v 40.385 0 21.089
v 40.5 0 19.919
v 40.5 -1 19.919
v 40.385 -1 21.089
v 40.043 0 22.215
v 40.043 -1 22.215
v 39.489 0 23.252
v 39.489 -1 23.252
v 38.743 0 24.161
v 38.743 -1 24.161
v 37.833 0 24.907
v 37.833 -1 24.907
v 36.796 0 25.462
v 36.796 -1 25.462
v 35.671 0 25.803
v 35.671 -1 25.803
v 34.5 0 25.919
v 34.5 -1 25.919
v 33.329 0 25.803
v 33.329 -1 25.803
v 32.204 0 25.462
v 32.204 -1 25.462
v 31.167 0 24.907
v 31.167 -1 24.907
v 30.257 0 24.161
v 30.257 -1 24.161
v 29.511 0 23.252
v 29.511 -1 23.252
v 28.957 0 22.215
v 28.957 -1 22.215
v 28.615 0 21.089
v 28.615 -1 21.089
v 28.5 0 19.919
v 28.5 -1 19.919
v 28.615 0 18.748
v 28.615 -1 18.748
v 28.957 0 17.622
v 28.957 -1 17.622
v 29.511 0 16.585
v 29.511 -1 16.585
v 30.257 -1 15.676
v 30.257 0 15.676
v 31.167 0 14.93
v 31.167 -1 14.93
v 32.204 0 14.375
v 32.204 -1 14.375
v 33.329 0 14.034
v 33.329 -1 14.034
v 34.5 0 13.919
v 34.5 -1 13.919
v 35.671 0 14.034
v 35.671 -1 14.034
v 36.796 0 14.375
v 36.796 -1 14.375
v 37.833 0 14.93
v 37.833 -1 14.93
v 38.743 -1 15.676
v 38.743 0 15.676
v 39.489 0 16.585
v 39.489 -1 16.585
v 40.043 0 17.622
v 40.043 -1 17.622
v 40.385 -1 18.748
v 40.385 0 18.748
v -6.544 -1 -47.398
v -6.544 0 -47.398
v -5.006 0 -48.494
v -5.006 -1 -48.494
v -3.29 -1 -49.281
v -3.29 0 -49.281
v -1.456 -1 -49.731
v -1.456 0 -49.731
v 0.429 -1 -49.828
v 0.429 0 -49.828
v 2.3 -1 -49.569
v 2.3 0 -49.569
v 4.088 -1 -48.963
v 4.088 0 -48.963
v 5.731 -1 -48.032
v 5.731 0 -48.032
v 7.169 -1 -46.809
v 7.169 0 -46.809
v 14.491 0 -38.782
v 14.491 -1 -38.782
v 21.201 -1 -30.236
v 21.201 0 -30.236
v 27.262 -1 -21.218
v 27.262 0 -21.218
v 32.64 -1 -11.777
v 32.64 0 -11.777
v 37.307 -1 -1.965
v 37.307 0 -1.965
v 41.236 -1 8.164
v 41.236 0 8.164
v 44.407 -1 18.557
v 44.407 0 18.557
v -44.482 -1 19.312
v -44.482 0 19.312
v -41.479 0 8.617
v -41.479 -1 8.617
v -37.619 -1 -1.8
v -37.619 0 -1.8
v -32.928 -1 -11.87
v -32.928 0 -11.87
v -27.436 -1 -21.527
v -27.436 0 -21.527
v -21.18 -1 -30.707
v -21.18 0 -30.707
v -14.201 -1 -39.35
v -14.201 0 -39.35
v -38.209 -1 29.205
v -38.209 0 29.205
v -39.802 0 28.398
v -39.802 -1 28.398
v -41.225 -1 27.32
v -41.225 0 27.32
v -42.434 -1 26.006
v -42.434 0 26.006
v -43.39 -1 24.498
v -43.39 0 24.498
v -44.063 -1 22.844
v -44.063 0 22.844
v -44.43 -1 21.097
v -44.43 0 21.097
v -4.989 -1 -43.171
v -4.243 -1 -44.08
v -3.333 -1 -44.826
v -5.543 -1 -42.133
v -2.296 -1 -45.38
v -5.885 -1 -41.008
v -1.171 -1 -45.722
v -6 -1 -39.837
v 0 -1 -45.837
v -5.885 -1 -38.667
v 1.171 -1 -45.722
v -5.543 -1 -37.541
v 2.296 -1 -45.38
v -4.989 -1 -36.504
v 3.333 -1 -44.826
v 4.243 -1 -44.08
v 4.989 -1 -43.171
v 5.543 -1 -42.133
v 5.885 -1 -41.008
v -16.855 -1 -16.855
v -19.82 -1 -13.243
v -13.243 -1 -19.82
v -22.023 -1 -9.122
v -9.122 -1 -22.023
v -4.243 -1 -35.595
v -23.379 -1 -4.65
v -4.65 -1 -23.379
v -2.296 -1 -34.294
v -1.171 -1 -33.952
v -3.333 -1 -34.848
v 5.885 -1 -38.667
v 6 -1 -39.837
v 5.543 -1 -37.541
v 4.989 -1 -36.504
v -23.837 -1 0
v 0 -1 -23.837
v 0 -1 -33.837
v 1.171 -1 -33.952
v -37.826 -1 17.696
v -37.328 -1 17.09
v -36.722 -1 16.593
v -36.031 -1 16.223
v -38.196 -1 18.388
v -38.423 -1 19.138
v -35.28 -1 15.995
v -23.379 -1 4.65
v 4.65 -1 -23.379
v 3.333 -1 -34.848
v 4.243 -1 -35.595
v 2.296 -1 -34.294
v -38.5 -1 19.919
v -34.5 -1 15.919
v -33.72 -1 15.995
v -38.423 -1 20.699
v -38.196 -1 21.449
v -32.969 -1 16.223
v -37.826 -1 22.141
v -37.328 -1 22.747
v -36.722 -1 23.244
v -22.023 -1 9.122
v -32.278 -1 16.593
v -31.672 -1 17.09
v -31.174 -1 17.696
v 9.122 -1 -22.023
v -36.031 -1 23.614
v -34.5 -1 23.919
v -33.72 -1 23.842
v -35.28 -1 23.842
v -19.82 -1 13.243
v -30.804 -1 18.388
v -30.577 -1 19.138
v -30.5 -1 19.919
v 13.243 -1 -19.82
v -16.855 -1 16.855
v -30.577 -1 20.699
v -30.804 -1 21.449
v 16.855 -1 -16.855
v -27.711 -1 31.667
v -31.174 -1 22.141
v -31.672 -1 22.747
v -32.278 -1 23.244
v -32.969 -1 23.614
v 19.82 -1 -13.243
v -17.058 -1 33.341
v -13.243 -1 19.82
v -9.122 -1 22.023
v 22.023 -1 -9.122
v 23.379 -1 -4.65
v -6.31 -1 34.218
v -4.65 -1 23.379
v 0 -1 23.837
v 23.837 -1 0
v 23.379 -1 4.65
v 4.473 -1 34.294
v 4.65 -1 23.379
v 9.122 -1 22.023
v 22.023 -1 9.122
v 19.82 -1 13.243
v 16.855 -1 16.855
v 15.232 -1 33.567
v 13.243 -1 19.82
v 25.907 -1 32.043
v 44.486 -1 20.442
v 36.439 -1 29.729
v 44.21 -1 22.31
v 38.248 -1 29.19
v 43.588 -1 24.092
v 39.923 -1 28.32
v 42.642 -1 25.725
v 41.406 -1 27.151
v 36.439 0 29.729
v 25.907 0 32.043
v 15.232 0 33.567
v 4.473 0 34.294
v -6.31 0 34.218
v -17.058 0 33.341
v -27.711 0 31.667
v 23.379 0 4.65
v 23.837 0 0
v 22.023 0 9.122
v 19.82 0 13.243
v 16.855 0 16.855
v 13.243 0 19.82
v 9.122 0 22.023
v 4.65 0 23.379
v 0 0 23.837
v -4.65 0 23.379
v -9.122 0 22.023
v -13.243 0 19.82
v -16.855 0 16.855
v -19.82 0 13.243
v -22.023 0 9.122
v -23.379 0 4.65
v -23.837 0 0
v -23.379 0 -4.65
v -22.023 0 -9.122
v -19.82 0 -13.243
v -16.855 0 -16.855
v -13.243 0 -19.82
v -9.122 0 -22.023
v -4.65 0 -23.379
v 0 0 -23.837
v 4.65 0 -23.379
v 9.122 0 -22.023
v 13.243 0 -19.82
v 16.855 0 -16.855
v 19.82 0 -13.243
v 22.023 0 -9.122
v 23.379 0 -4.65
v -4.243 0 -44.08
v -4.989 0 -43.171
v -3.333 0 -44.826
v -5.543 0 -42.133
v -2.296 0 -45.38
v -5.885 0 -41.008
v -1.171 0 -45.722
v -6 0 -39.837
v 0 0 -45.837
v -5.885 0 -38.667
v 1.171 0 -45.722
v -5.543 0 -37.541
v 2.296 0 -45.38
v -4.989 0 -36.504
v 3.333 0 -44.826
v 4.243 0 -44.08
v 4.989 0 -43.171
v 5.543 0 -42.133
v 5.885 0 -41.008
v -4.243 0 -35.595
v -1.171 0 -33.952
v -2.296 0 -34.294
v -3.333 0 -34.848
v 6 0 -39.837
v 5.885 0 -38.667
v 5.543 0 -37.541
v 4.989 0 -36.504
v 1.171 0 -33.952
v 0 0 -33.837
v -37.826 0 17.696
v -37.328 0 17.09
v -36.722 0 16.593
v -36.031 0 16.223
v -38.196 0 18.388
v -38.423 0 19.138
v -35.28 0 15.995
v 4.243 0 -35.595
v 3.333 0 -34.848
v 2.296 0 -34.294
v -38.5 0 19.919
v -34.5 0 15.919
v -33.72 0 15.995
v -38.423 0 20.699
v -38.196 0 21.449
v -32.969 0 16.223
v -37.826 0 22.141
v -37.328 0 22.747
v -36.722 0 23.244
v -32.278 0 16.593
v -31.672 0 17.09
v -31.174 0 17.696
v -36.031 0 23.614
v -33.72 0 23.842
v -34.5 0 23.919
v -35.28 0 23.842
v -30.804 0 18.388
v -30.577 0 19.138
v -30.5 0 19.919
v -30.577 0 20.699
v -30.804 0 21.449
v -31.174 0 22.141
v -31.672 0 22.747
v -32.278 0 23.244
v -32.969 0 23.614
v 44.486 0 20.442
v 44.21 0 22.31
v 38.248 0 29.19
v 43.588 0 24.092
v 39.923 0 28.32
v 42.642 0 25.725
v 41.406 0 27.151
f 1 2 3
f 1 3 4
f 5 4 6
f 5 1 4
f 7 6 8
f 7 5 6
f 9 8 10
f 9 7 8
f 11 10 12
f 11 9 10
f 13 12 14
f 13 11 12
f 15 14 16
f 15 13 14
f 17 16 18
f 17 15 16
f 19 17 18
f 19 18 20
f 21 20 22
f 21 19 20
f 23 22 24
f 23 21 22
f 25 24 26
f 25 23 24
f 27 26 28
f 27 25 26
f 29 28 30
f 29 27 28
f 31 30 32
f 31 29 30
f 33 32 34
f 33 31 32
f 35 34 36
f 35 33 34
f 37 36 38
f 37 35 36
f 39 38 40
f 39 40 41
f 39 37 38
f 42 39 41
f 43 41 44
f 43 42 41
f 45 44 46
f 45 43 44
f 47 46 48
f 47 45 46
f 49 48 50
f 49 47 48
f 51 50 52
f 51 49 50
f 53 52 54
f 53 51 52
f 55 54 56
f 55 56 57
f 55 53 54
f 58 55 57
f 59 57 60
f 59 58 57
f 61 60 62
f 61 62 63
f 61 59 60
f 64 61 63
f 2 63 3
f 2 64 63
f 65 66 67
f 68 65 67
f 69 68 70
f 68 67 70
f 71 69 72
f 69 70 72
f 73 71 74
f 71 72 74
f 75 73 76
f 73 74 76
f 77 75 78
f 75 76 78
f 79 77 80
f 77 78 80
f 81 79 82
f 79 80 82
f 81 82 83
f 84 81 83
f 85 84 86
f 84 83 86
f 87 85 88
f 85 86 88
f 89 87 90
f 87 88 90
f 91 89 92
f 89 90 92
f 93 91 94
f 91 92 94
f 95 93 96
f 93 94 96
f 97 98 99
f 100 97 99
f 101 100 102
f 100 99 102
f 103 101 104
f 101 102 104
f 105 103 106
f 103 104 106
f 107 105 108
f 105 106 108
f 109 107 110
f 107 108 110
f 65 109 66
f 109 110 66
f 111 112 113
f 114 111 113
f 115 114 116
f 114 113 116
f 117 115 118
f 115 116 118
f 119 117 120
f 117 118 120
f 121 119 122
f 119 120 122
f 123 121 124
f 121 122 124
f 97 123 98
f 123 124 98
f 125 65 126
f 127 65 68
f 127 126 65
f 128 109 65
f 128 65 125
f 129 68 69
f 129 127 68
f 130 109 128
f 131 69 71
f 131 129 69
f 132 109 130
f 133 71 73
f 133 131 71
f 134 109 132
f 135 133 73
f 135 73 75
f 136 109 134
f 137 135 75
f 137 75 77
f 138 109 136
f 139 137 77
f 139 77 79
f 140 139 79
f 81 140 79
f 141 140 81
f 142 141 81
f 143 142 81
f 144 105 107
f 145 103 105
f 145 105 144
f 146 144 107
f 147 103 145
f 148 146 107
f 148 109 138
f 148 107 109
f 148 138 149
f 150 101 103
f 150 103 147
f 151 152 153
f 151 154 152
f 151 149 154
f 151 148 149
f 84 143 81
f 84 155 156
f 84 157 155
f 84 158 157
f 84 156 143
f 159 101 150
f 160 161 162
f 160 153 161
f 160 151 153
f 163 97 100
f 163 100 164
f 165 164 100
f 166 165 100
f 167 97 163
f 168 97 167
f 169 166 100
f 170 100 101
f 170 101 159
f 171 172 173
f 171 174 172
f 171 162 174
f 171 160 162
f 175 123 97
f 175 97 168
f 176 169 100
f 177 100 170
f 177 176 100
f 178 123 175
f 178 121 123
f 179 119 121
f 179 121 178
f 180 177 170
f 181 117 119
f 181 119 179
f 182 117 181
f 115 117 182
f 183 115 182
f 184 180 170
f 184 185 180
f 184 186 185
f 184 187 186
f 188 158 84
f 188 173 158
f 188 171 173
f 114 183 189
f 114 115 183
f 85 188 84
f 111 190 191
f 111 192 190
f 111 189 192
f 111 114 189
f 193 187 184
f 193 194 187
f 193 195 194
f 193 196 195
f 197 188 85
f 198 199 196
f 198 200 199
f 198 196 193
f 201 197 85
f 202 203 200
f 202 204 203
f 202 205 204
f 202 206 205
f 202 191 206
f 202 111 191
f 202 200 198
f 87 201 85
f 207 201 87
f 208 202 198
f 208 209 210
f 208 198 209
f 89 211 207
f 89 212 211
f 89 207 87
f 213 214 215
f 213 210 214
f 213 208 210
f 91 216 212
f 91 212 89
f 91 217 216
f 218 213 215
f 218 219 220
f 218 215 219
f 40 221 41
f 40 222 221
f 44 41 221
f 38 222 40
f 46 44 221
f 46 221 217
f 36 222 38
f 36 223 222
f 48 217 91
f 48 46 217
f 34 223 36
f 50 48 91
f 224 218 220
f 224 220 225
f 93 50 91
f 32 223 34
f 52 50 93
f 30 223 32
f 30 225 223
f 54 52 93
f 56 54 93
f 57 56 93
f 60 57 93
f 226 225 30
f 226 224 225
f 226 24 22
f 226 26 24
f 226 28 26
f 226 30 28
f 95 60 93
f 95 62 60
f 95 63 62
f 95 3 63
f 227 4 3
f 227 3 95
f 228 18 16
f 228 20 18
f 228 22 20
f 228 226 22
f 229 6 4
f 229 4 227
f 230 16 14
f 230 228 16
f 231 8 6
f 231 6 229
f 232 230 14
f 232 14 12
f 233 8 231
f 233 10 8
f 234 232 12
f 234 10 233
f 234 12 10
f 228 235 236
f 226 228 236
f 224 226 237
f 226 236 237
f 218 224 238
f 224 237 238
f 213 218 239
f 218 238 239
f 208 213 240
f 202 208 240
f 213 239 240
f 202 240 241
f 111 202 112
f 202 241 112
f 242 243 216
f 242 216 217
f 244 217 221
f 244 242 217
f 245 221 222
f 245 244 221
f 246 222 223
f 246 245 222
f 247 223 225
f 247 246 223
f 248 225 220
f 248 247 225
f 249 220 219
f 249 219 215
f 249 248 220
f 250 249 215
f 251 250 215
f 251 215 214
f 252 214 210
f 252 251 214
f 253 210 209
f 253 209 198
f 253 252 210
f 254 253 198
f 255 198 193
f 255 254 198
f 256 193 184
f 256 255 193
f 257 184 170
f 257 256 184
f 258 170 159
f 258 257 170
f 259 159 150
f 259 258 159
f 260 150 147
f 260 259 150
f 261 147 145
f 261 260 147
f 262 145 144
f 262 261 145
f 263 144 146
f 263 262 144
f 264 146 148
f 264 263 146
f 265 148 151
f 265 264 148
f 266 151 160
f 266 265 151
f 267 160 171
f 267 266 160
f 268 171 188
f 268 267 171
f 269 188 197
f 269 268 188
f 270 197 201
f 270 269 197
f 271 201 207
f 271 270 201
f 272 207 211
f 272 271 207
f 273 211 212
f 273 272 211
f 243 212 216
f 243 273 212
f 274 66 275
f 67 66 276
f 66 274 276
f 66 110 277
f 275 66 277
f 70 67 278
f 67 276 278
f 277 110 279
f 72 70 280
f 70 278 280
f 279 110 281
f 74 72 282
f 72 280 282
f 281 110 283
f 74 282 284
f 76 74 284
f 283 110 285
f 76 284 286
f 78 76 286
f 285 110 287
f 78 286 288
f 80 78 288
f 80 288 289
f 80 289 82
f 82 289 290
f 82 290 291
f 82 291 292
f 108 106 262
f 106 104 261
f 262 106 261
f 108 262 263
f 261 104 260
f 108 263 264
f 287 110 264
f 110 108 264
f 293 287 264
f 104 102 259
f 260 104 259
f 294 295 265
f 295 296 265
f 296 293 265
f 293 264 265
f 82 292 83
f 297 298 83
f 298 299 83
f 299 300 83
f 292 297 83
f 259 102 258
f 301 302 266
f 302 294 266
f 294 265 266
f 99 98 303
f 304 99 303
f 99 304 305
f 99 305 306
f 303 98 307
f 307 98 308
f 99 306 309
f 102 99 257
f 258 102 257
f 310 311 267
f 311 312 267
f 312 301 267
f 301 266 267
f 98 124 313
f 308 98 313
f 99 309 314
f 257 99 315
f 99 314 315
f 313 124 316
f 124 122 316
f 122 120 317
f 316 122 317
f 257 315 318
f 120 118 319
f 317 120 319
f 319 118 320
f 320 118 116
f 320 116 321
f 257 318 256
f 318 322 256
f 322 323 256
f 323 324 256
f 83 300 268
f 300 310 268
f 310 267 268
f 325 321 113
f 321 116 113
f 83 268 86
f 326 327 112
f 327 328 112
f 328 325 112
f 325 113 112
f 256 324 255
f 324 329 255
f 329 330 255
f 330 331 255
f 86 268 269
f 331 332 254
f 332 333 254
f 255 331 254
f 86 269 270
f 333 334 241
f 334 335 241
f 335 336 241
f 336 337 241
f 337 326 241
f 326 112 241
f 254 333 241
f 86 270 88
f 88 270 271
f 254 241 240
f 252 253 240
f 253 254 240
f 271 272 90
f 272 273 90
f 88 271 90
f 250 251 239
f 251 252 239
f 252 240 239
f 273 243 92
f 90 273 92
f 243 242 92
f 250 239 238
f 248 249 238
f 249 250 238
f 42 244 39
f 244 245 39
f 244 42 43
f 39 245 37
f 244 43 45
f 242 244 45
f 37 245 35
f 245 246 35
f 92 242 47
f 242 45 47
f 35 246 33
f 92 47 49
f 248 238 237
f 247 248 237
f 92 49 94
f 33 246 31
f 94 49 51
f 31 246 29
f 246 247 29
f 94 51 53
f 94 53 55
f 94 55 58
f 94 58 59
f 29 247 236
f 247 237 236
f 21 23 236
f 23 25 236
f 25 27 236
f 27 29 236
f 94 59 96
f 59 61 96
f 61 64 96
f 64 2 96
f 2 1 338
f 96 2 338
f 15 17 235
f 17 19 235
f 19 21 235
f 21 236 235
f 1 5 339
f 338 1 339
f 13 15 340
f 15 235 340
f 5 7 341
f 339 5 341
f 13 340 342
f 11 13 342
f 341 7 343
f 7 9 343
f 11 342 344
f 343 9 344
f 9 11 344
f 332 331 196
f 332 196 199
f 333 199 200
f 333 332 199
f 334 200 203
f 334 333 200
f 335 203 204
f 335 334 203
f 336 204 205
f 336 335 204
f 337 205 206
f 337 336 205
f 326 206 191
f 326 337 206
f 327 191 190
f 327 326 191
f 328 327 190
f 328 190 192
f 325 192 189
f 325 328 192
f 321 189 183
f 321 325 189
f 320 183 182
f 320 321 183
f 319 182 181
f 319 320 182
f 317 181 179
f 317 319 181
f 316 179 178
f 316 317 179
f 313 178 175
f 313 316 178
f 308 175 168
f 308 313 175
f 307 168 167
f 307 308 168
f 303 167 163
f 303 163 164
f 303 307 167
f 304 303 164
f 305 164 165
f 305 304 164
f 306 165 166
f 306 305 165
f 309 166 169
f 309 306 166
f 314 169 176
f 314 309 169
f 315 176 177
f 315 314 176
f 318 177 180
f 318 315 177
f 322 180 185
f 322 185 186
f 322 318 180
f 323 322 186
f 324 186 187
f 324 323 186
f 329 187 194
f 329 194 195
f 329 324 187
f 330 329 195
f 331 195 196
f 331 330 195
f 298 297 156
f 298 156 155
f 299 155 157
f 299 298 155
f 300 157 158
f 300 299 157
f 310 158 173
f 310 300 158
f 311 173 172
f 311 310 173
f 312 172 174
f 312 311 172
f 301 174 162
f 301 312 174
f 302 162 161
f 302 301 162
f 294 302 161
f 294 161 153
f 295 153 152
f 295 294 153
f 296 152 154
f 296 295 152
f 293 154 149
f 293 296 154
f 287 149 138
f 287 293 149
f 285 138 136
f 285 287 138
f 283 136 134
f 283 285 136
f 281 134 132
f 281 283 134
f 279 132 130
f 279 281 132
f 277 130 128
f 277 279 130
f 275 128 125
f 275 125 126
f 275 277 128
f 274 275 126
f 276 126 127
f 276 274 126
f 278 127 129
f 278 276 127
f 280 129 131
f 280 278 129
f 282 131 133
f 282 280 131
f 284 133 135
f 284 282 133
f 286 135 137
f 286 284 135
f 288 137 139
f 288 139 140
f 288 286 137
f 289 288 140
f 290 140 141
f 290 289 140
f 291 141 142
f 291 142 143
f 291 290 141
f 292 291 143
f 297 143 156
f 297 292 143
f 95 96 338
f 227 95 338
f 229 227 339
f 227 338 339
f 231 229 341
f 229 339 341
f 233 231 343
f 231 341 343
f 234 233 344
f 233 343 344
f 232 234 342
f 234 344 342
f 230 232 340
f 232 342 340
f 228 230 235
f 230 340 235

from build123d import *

# Parameters (mm, degrees)
F0_R     = 6
F0_R_2   = 4
F0_R_3   = 23.837169
F1_DEPTH = 1


with BuildPart() as f1:
    # F0 (on Front) → F1 (new body)
    with BuildSketch(Plane.XZ):
        with BuildLine():
            ThreePointArc((36.439317, 29.728735), (-0.919317, 34.356199), (-38.209367, 29.205166))
            ThreePointArc((-38.209367, 29.205166), (-42.945645, 25.273123), (-44.48159, 19.312069))
            ThreePointArc((-44.48159, 19.312069), (-30.280128, -16.75426), (-6.54421, -47.398472))
            ThreePointArc((-6.54421, -47.398472), (0.429493, -49.827941), (7.168973, -46.808956))
            ThreePointArc((7.168973, -46.808956), (30.038151, -16.547447), (44.406826, 18.556677))
            ThreePointArc((44.406826, 18.556677), (42.641652, 25.724917), (36.439317, 29.728735))
        make_face()
        with Locations((0, -39.837169)):
            Circle(F0_R, mode=Mode.SUBTRACT)
        with Locations((-34.5, 19.918584)):
            Circle(F0_R_2, mode=Mode.SUBTRACT)
        Circle(F0_R_3, mode=Mode.SUBTRACT)
        with Locations((34.5, 19.918584)):
            Circle(F0_R, mode=Mode.SUBTRACT)
    extrude(amount=F1_DEPTH)


solid = f1.part
